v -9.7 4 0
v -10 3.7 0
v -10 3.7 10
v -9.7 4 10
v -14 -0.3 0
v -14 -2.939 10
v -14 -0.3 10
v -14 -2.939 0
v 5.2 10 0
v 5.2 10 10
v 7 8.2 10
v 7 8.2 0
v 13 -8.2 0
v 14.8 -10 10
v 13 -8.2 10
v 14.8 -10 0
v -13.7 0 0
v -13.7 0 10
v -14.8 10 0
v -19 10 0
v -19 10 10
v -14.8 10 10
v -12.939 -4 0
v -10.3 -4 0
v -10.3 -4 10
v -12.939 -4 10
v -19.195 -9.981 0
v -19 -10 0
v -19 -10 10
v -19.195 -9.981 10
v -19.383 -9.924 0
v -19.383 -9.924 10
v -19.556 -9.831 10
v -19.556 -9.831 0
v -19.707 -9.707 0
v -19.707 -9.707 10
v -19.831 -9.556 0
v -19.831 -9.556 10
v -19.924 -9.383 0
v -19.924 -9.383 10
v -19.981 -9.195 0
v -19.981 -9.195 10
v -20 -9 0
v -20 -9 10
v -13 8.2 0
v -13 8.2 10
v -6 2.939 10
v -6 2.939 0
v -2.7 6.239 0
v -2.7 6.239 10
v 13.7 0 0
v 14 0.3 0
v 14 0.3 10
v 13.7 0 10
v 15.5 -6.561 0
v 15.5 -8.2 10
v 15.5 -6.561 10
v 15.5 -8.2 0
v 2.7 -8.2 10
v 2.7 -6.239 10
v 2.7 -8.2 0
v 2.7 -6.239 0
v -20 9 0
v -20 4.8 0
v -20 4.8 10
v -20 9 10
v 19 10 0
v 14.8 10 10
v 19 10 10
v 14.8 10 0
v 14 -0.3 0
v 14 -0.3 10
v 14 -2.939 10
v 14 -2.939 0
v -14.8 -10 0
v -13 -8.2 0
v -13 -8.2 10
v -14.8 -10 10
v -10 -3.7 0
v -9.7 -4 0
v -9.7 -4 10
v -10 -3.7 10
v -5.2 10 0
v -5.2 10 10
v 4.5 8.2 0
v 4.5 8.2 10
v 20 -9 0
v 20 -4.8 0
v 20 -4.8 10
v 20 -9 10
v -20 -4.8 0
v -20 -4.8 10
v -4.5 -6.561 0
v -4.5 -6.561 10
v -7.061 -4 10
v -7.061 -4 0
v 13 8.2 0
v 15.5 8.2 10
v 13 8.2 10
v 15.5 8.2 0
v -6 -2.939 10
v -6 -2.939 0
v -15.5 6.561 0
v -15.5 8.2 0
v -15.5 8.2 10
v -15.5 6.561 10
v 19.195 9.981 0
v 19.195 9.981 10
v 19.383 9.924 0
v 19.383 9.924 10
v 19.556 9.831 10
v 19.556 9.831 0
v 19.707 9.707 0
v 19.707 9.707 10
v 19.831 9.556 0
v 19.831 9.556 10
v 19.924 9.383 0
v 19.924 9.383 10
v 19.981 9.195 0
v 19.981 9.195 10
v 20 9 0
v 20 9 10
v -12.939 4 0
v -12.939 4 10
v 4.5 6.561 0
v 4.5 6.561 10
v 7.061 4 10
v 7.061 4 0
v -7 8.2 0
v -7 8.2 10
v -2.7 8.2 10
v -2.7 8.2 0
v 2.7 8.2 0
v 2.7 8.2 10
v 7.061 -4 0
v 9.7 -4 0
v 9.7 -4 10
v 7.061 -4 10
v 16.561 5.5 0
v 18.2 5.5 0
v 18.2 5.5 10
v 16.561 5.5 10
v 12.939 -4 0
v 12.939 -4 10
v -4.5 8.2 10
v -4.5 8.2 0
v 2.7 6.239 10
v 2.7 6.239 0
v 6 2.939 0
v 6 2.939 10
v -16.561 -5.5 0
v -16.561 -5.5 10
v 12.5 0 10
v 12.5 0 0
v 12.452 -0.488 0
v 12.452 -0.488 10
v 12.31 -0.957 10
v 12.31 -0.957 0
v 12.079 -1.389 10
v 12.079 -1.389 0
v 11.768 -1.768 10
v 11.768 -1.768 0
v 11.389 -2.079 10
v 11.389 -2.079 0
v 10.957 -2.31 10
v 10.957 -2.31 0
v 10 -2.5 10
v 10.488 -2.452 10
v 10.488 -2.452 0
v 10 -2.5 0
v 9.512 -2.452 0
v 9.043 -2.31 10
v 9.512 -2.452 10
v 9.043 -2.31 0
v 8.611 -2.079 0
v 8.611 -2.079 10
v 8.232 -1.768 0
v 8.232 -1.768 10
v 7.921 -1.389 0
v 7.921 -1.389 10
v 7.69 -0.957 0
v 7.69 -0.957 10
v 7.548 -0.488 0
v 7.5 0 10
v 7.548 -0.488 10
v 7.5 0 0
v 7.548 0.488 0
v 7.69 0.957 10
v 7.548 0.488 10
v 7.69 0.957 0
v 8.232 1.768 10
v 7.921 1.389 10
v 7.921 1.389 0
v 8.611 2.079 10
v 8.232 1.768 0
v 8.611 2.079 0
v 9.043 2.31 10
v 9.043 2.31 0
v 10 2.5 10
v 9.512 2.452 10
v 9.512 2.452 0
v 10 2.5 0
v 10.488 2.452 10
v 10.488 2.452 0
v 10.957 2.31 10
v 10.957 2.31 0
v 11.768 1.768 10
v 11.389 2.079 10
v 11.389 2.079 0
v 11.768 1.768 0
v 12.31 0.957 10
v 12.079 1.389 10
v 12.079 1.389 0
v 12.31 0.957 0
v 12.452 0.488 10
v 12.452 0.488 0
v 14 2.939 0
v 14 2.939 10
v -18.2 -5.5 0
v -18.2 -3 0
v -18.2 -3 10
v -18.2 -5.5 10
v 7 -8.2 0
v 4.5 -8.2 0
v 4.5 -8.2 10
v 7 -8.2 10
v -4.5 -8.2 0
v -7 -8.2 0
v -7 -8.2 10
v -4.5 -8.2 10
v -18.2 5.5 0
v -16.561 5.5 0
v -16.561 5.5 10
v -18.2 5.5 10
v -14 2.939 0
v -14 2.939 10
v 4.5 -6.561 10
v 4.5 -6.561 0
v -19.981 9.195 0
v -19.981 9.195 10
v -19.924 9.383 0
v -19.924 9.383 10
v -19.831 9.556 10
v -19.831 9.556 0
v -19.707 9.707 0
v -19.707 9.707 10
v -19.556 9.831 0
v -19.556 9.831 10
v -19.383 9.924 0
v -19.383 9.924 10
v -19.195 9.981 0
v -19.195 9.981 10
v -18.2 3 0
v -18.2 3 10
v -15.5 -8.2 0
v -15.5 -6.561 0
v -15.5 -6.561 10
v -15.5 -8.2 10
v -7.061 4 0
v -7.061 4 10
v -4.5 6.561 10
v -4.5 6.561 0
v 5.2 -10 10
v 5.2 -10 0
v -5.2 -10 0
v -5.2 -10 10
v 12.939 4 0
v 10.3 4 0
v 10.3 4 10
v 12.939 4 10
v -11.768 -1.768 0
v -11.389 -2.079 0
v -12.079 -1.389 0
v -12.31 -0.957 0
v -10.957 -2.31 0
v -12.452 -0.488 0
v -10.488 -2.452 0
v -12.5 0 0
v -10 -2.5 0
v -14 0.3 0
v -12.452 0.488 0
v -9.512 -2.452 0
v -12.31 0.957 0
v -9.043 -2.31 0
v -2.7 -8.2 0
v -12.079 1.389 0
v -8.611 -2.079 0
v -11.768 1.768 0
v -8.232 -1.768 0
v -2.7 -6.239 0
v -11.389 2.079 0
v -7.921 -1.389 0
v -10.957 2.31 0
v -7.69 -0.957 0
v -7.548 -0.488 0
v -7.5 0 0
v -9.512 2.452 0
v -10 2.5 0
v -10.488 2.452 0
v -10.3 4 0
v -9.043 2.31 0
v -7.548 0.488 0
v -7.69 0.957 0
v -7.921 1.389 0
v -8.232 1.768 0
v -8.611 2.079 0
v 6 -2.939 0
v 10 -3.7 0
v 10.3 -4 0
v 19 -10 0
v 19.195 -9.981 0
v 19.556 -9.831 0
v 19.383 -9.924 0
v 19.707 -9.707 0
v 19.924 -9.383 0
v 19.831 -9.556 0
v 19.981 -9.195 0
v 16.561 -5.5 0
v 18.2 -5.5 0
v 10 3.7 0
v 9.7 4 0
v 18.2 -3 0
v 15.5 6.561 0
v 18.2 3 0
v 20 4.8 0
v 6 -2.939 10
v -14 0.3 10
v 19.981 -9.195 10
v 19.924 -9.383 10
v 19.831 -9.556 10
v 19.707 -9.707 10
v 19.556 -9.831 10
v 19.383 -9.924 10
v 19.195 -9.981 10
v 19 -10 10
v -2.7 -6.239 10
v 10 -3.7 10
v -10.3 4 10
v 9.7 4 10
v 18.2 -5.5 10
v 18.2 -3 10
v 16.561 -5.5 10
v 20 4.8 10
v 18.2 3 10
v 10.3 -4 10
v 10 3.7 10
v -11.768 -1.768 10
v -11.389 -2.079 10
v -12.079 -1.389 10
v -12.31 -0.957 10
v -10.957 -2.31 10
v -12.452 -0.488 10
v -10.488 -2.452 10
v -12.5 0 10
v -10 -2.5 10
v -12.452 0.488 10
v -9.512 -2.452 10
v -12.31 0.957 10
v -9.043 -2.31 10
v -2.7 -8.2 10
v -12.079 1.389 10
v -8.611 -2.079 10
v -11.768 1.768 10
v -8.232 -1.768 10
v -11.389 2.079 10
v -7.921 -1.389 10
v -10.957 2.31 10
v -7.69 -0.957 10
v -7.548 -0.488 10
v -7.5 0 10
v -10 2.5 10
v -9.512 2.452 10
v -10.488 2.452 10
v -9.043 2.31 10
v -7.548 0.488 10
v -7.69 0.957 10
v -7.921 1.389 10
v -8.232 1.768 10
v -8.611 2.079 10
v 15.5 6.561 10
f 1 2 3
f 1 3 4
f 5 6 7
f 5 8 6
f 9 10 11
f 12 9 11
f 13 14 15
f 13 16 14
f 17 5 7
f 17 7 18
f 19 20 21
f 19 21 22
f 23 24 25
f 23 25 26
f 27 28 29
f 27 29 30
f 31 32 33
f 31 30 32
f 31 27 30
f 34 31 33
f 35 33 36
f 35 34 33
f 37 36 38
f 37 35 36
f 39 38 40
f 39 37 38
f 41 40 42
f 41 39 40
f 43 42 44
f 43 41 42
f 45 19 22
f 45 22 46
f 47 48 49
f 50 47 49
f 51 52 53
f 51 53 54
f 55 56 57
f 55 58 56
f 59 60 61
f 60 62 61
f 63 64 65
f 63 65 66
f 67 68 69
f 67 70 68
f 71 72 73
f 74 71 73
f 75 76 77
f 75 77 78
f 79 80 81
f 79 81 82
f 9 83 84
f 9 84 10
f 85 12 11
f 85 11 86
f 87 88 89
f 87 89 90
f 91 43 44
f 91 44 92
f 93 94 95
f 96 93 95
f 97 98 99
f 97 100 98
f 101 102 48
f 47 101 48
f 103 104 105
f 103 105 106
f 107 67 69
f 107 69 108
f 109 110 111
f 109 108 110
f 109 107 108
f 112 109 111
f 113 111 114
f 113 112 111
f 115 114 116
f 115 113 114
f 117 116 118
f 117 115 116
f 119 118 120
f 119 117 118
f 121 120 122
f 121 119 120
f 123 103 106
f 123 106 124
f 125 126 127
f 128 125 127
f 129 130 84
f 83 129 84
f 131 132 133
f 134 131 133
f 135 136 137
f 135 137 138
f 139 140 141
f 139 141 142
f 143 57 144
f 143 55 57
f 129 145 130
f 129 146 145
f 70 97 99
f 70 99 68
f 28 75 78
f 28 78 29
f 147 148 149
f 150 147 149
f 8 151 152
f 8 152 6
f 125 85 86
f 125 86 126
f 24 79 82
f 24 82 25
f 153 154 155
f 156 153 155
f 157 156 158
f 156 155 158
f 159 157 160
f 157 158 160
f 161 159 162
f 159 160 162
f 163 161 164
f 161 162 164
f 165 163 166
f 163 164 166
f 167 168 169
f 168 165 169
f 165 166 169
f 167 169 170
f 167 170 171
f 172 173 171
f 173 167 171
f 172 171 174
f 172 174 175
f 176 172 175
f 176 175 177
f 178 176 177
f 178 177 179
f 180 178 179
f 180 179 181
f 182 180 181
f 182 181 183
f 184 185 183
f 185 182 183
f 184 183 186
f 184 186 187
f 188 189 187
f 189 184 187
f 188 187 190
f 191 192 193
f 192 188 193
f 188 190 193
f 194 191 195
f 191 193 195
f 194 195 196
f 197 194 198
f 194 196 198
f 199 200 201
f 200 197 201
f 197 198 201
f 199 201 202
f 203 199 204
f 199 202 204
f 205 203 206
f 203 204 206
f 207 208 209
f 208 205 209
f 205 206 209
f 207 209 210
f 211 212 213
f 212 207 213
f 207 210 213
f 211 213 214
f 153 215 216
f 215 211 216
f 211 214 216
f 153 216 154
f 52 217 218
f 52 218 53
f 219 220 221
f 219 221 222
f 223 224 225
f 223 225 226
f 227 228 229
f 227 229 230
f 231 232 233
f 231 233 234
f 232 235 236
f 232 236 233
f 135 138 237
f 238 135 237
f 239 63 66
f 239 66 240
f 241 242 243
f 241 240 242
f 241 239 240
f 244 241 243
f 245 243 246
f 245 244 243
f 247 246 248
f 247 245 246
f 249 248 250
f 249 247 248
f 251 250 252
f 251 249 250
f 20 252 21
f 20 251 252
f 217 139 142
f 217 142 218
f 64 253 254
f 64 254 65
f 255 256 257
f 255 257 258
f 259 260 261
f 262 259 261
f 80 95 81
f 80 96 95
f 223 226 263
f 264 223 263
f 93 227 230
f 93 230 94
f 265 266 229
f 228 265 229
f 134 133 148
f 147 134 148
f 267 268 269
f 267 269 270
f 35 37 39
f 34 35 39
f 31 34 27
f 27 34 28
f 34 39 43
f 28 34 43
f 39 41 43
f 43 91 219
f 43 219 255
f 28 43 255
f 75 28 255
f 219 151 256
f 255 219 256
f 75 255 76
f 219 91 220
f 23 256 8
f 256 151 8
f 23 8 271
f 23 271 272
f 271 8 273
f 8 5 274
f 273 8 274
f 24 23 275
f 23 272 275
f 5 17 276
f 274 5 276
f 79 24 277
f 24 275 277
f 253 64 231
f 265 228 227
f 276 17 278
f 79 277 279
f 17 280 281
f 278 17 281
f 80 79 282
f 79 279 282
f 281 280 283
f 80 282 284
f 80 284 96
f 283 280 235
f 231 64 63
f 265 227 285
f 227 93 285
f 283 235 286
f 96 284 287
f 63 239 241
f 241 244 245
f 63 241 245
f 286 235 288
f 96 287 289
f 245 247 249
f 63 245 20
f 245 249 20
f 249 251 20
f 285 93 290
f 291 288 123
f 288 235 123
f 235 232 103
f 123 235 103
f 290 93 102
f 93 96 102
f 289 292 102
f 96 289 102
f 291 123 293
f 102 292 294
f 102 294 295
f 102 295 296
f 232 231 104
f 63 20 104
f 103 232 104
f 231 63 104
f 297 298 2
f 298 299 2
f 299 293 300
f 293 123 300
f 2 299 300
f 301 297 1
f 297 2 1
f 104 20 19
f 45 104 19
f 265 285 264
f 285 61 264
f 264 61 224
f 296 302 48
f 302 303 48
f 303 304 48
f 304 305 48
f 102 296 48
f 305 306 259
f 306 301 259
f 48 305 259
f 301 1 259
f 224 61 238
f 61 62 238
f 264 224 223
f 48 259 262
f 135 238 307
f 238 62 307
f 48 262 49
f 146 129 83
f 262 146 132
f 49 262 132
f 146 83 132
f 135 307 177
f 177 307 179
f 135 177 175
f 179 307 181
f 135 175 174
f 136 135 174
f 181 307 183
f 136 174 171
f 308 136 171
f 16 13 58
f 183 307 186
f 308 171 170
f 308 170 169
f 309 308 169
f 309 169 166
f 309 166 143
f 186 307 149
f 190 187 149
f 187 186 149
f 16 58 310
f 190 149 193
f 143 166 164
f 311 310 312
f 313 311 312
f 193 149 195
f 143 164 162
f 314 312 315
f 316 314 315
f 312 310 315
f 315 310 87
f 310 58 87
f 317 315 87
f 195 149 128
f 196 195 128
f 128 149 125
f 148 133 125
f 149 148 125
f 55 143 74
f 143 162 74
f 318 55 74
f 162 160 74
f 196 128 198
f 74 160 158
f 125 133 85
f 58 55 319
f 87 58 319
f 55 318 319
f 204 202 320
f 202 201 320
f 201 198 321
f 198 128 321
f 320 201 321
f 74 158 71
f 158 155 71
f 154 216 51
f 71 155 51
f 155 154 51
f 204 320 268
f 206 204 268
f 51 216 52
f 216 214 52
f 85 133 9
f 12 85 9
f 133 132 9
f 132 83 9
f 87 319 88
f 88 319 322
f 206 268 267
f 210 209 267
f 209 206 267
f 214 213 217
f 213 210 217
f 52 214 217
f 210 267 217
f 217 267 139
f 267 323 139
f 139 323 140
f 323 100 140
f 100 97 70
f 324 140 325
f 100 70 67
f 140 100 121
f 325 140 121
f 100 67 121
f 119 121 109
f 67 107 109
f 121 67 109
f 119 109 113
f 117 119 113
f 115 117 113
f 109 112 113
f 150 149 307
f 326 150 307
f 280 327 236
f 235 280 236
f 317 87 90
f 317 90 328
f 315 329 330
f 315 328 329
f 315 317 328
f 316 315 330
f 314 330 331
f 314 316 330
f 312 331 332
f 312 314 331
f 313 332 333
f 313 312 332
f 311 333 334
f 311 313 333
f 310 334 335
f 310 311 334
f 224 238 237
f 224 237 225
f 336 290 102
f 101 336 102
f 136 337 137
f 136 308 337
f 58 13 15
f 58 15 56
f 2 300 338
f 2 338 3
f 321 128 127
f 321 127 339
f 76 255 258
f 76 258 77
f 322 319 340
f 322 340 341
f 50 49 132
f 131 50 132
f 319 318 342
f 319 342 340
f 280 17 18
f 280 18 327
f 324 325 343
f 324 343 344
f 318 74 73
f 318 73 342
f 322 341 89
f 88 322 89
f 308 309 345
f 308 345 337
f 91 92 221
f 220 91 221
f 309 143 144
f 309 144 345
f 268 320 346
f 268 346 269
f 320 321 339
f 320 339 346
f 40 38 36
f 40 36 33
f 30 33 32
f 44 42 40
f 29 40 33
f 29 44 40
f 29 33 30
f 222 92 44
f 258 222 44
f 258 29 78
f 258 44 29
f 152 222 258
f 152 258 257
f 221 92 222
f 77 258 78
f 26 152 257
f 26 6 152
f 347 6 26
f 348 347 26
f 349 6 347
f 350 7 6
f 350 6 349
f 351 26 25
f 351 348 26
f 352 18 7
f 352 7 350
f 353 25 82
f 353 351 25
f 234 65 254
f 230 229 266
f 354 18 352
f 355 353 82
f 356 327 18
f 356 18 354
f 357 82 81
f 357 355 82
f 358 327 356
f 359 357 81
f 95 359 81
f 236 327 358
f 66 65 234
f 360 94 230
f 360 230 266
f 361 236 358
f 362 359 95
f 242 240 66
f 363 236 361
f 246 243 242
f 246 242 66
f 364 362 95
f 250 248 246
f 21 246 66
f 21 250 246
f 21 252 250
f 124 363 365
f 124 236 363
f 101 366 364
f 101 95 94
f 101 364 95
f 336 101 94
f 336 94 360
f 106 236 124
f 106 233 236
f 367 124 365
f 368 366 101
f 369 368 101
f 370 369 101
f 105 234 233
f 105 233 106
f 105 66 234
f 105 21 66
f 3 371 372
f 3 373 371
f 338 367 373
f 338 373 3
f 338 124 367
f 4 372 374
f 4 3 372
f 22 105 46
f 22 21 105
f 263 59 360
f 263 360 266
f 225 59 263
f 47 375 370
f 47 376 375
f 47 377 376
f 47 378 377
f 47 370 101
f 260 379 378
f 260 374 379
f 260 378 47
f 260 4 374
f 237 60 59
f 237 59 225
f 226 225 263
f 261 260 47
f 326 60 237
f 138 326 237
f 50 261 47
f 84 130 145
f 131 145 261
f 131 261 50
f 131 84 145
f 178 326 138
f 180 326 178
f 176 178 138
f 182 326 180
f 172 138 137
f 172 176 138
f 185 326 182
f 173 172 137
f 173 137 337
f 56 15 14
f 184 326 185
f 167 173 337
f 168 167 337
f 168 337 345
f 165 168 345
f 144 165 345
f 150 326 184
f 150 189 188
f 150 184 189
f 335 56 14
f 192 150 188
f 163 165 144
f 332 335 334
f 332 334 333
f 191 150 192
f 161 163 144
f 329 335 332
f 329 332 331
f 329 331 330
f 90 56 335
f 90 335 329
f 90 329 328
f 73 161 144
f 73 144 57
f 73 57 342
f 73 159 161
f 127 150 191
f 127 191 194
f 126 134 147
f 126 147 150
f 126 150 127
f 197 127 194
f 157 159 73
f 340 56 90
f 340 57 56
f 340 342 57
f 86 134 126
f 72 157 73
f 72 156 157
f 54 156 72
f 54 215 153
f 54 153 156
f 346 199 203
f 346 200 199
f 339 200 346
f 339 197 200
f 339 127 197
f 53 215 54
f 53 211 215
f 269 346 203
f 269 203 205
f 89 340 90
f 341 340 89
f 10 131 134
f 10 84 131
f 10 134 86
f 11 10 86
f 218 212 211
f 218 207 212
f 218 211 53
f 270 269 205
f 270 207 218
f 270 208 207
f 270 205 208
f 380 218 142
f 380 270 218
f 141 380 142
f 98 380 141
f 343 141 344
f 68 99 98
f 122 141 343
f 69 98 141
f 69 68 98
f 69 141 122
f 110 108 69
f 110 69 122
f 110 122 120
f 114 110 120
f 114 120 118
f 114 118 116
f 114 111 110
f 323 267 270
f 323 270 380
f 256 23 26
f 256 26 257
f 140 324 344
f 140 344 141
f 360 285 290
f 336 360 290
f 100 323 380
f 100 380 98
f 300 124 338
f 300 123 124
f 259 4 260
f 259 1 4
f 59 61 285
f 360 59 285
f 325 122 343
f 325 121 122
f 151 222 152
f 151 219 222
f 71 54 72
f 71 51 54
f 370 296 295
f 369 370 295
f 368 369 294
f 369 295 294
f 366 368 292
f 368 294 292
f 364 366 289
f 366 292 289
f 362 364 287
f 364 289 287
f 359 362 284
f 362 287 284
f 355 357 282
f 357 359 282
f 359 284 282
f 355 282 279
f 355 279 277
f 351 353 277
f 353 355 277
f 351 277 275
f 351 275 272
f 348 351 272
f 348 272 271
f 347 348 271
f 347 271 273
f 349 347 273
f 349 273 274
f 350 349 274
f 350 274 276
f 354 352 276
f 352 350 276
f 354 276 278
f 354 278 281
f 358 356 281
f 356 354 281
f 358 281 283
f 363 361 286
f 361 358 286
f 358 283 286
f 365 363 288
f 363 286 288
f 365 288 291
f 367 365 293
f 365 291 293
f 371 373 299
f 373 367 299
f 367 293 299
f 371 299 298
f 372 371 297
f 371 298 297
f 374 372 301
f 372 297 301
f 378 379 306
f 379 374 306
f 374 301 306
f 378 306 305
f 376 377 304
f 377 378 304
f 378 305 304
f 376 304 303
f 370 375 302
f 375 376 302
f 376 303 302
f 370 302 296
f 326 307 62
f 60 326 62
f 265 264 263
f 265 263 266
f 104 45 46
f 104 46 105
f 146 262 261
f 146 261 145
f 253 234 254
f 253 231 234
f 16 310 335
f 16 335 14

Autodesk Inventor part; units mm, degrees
ref_plane "YZ Plane" through (0, 0, 0) normal (1, 0, 0) x (0, 1, 0)
ref_plane "XZ Plane" through (0, 0, 0) normal (0, 1, 0) x (-1, 0, 0)
ref_plane "XY Plane" through (0, 0, 0) normal (0, 0, 1) x (1, 0, 0)
sketch "Esboço1" plane through (0, 0, 0) normal (0, 0, 1) x (1, 0, 0)
  arc A0 (19, -10) -> (20, -9) centre (19, -9) ccw
  line L0 (20, -4.8) -> (20, -9)
  line L1 (18.2, -3) -> (20, -4.8)
  line L2 (18.2, -5.5) -> (18.2, -3)
  line L3 (16.5607, -5.5) -> (18.2, -5.5)
  line L4 (14, -2.9393) -> (16.5607, -5.5)
  line L5 (14, -0.3) -> (14, -2.9393)
  line L6 (13.7, 0) -> (14, -0.3)
  line L7 (14, 0.3) -> (13.7, 0)
  line L8 (14, 2.9393) -> (14, 0.3)
  line L9 (16.5607, 5.5) -> (14, 2.9393)
  line L10 (18.2, 5.5) -> (16.5607, 5.5)
  line L11 (18.2, 3) -> (18.2, 5.5)
  line L12 (20, 4.8) -> (18.2, 3)
  line L13 (20, 9) -> (20, 4.8)
  arc A1 (20, 9) -> (19, 10) centre (19, 9) ccw
  line L14 (14.8, 10) -> (19, 10)
  line L15 (13, 8.2) -> (14.8, 10)
  line L16 (15.5, 8.2) -> (13, 8.2)
  line L17 (15.5, 6.5607) -> (15.5, 8.2)
  line L18 (12.9393, 4) -> (15.5, 6.5607)
  line L19 (10.3, 4) -> (12.9393, 4)
  line L20 (10, 3.7) -> (10.3, 4)
  line L21 (9.7, 4) -> (10, 3.7)
  line L22 (7.0607, 4) -> (9.7, 4)
  line L23 (4.5, 6.5607) -> (7.0607, 4)
  line L24 (4.5, 8.2) -> (4.5, 6.5607)
  line L25 (7, 8.2) -> (4.5, 8.2)
  line L26 (5.2, 10) -> (7, 8.2)
  line L27 (-5.2, 10) -> (5.2, 10)
  line L28 (-7, 8.2) -> (-5.2, 10)
  line L29 (-4.5, 8.2) -> (-7, 8.2)
  line L30 (-4.5, 6.5607) -> (-4.5, 8.2)
  line L31 (-7.0607, 4) -> (-4.5, 6.5607)
  line L32 (-9.7, 4) -> (-7.0607, 4)
  line L33 (-10, 3.7) -> (-9.7, 4)
  line L34 (-10.3, 4) -> (-10, 3.7)
  line L35 (-12.9393, 4) -> (-10.3, 4)
  line L36 (-15.5, 6.5607) -> (-12.9393, 4)
  line L37 (-15.5, 8.2) -> (-15.5, 6.5607)
  line L38 (-13, 8.2) -> (-15.5, 8.2)
  line L39 (-14.8, 10) -> (-13, 8.2)
  line L40 (-19, 10) -> (-14.8, 10)
  arc A2 (-19, 10) -> (-20, 9) centre (-19, 9) ccw
  line L41 (-20, 4.8) -> (-20, 9)
  line L42 (-18.2, 3) -> (-20, 4.8)
  line L43 (-18.2, 5.5) -> (-18.2, 3)
  line L44 (-16.5607, 5.5) -> (-18.2, 5.5)
  line L45 (-14, 2.9393) -> (-16.5607, 5.5)
  line L46 (-14, 0.3) -> (-14, 2.9393)
  line L47 (-13.7, 0) -> (-14, 0.3)
  line L48 (-14, -0.3) -> (-13.7, 0)
  line L49 (-14, -2.9393) -> (-14, -0.3)
  line L50 (-16.5607, -5.5) -> (-14, -2.9393)
  line L51 (-18.2, -5.5) -> (-16.5607, -5.5)
  line L52 (-18.2, -3) -> (-18.2, -5.5)
  line L53 (-20, -4.8) -> (-18.2, -3)
  line L54 (-20, -9) -> (-20, -4.8)
  arc A3 (-20, -9) -> (-19, -10) centre (-19, -9) ccw
  line L55 (-14.8, -10) -> (-19, -10)
  line L56 (-13, -8.2) -> (-14.8, -10)
  line L57 (-15.5, -8.2) -> (-13, -8.2)
  line L58 (-15.5, -6.5607) -> (-15.5, -8.2)
  line L59 (-12.9393, -4) -> (-15.5, -6.5607)
  line L60 (-10.3, -4) -> (-12.9393, -4)
  line L61 (-10, -3.7) -> (-10.3, -4)
  line L62 (-9.7, -4) -> (-10, -3.7)
  line L63 (-7.0607, -4) -> (-9.7, -4)
  line L64 (-4.5, -6.5607) -> (-7.0607, -4)
  line L65 (-4.5, -8.2) -> (-4.5, -6.5607)
  line L66 (-7, -8.2) -> (-4.5, -8.2)
  line L67 (-5.2, -10) -> (-7, -8.2)
  line L68 (5.2, -10) -> (-5.2, -10)
  line L69 (7, -8.2) -> (5.2, -10)
  line L70 (4.5, -8.2) -> (7, -8.2)
  line L71 (4.5, -6.5607) -> (4.5, -8.2)
  line L72 (7.0607, -4) -> (4.5, -6.5607)
  line L73 (9.7, -4) -> (7.0607, -4)
  line L74 (10, -3.7) -> (9.7, -4)
  line L75 (10.3, -4) -> (10, -3.7)
  line L76 (12.9393, -4) -> (10.3, -4)
  line L77 (15.5, -6.5607) -> (12.9393, -4)
  line L78 (15.5, -8.2) -> (15.5, -6.5607)
  line L79 (13, -8.2) -> (15.5, -8.2)
  line L80 (14.8, -10) -> (13, -8.2)
  line L81 (19, -10) -> (14.8, -10)
  line L82 (-2.7, 8.2) -> (2.7, 8.2)
  line L83 (2.7, 8.2) -> (2.7, 6.2393)
  line L84 (2.7, 6.2393) -> (6, 2.9393)
  line L85 (6, 2.9393) -> (6, -2.9393)
  line L86 (6, -2.9393) -> (2.7, -6.2393)
  line L87 (2.7, -6.2393) -> (2.7, -8.2)
  line L88 (2.7, -8.2) -> (-2.7, -8.2)
  line L89 (-2.7, -8.2) -> (-2.7, -6.2393)
  line L90 (-2.7, -6.2393) -> (-6, -2.9393)
  line L91 (-6, -2.9393) -> (-6, 2.9393)
  line L92 (-6, 2.9393) -> (-2.7, 6.2393)
  line L93 (-2.7, 6.2393) -> (-2.7, 8.2)
  circle A4 centre (10, 0) radius 2.5
  circle A5 centre (-10, 0) radius 2.5
  point P0 (0, 0)
  point P1 (0, 0)
extrude "Extrusão1" add sketch "Esboço1" along normal blind 10
properties part number "PERFIL_ESTRUTURAL_20X40"
